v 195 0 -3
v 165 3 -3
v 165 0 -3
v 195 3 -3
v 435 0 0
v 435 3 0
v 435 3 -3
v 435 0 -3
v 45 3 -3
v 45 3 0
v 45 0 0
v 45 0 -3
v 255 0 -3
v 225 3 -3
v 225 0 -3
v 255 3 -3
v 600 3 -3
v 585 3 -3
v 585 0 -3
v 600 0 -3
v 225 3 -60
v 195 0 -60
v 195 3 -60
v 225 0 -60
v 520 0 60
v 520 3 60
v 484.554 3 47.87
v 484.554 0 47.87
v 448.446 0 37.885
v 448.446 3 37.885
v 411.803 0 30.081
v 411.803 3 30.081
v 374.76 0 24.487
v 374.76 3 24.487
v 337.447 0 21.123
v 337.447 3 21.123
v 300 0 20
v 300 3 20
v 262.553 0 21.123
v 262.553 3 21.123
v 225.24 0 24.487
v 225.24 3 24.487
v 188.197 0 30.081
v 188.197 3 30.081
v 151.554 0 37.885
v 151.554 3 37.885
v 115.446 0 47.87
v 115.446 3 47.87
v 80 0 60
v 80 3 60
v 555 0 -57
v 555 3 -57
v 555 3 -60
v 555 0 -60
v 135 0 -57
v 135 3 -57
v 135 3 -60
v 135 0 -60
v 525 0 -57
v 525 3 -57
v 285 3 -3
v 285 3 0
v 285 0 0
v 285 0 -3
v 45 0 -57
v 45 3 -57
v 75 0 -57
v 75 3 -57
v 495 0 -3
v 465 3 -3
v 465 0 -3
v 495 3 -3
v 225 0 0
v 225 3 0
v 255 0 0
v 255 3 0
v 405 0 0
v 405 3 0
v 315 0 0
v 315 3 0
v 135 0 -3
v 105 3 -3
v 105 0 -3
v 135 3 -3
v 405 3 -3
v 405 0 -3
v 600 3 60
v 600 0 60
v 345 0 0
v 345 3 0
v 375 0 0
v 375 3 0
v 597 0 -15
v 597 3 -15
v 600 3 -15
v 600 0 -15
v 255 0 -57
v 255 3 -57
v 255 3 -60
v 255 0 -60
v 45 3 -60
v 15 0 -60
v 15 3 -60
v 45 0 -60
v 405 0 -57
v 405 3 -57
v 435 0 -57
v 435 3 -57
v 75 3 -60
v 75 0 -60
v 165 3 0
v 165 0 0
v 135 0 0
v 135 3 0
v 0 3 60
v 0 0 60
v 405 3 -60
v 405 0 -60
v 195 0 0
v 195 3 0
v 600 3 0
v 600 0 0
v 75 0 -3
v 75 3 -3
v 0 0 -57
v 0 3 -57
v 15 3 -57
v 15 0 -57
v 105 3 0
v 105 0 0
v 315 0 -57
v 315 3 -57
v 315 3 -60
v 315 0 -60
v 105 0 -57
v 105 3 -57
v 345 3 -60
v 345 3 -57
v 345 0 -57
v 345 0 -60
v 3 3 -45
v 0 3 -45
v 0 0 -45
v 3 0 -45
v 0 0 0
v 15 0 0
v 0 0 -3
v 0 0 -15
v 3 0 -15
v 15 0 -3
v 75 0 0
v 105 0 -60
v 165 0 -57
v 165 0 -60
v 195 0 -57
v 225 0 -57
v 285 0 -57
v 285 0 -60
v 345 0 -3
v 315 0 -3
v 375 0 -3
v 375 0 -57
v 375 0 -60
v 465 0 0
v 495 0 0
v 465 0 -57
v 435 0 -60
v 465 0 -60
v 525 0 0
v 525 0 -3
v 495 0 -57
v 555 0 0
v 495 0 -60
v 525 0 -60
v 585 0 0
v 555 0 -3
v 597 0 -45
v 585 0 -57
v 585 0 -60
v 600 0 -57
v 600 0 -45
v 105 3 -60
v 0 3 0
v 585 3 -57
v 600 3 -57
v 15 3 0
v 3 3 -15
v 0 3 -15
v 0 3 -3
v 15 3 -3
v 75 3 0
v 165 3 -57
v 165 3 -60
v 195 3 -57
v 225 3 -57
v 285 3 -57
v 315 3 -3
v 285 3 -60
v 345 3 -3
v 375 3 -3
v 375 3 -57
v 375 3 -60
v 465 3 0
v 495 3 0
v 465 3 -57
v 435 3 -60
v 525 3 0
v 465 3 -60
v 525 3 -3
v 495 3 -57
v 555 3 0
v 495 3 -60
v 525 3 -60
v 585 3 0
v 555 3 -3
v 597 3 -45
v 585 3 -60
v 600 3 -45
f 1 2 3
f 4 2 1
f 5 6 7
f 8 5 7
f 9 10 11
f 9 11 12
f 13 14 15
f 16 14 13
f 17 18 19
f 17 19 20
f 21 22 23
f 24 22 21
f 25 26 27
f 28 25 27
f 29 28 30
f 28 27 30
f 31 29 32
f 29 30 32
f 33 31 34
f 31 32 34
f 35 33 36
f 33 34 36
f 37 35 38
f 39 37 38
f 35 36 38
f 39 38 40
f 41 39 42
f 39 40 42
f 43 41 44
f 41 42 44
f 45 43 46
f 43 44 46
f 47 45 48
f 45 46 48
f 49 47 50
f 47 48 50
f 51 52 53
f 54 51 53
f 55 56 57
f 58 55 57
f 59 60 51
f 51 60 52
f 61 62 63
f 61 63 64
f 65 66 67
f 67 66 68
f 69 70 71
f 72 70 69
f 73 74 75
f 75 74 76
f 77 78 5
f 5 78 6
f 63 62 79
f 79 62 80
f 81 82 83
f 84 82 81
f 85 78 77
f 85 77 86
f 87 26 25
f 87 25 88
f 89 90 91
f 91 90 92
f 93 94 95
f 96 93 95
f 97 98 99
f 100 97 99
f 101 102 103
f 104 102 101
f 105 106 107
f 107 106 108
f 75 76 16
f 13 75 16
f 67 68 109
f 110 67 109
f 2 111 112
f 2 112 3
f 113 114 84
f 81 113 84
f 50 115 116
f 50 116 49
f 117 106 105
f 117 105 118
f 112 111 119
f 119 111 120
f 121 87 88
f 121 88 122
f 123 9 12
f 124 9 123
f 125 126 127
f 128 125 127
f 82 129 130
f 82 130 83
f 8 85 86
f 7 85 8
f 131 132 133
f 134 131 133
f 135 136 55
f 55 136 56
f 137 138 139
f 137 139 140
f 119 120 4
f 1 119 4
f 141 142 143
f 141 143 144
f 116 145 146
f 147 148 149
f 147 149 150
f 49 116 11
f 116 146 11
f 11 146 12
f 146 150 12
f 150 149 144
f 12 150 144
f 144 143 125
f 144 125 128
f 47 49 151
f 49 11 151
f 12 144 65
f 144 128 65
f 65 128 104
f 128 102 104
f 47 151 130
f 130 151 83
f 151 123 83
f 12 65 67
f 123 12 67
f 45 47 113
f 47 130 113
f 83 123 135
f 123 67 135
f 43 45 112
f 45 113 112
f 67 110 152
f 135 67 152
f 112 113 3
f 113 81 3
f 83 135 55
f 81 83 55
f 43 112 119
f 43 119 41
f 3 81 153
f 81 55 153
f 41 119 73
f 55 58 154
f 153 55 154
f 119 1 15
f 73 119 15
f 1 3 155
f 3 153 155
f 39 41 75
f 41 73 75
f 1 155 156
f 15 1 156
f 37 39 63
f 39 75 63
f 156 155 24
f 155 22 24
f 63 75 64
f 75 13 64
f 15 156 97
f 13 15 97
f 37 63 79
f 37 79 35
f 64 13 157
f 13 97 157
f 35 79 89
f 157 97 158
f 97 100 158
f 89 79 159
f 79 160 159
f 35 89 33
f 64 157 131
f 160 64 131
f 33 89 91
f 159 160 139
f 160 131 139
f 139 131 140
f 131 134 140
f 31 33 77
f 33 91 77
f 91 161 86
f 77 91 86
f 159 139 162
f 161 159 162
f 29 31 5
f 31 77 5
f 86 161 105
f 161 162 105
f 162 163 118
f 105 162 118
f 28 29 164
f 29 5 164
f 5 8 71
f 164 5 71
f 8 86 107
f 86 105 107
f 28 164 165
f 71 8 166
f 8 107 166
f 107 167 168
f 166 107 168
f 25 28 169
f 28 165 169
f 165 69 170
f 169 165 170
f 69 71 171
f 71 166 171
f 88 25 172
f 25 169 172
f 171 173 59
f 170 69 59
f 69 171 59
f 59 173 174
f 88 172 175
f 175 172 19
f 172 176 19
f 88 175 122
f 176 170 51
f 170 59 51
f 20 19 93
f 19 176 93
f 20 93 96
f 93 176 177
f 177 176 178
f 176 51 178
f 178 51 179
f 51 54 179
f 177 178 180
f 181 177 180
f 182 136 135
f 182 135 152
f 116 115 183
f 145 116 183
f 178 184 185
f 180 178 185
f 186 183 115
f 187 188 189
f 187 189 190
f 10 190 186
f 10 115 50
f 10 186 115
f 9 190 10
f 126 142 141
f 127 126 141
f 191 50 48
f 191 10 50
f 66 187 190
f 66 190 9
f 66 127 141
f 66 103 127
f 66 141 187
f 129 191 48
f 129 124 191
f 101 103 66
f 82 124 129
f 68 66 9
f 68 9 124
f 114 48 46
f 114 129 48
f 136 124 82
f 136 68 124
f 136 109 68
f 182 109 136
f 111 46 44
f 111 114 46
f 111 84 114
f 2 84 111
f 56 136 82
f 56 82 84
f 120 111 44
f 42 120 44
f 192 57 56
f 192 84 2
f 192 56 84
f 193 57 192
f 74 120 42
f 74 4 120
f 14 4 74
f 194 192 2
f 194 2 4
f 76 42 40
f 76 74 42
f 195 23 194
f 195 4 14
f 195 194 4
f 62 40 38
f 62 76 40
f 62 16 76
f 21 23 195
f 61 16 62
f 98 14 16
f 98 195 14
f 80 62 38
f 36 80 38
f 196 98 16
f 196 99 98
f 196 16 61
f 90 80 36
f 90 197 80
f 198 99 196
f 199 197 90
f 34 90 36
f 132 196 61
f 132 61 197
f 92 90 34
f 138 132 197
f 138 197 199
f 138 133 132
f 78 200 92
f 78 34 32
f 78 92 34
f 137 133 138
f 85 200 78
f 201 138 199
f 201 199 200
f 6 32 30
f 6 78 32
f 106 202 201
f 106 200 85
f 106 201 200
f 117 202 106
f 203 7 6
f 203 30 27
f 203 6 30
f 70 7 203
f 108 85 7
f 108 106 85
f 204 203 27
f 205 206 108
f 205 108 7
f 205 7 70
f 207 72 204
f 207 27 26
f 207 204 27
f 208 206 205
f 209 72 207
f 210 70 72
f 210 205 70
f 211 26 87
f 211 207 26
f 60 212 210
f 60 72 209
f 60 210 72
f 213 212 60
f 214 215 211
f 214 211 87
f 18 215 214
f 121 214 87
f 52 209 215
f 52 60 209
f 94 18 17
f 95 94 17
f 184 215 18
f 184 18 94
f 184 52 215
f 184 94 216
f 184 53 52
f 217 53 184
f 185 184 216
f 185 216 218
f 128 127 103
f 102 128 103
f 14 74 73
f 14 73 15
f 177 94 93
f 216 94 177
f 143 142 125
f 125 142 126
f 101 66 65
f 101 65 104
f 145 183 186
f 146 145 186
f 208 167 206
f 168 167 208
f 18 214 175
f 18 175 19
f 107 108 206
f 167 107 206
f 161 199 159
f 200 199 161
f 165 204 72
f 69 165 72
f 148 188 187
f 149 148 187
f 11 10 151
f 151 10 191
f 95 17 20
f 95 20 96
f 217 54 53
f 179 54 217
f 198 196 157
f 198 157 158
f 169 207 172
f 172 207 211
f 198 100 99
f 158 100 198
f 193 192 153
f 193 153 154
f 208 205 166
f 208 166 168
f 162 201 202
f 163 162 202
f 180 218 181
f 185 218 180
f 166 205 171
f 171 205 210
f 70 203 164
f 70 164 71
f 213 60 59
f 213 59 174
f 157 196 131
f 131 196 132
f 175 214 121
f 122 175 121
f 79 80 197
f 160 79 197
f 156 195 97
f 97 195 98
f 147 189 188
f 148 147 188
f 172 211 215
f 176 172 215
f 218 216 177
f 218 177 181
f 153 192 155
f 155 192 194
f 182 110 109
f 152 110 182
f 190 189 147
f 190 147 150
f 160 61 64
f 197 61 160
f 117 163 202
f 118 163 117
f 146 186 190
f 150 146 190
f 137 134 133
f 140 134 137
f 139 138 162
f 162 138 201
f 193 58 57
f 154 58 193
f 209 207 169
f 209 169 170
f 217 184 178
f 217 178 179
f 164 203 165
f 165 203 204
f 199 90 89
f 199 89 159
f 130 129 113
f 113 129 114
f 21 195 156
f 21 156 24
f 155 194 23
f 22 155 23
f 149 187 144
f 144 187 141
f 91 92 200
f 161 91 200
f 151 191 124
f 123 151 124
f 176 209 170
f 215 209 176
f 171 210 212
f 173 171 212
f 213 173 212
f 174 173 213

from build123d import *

# Parameters (mm, degrees)
SKETCH1_W           = 600
SKETCH1_H           = 60
BOSS_EXTRUDE1_DEPTH = 3
SKETCH3_W           = 600
SKETCH3_H           = 60
BOSS_EXTRUDE2_DEPTH = 3
SKETCH2_W           = 30
SKETCH2_H           = 3
SKETCH2_W_2         = 3
SKETCH2_H_2         = 30
CUT_EXTRUDE1_DEPTH  = 5
CUT_EXTRUDE2_DEPTH  = 5


with BuildPart() as part:
    # Sketch1 → Boss-Extrude1 (new body)
    with BuildSketch(Plane(origin=(0, 0, 0), x_dir=(1, 0, 0), z_dir=(0, 1, 0))):
        with Locations((300, 30)):
            Rectangle(SKETCH1_W, SKETCH1_H)
    extrude(amount=BOSS_EXTRUDE1_DEPTH)

    # Sketch3 → Boss-Extrude2 (add)
    with BuildSketch(Plane(origin=(0, 3, 0), x_dir=(1, 0, 0), z_dir=(0, 1, 0))):
        with Locations((300, -30)):
            Rectangle(SKETCH3_W, SKETCH3_H)
    extrude(amount=-BOSS_EXTRUDE2_DEPTH)

    # Sketch2 → Cut-Extrude1 (cut)
    with BuildSketch(Plane(origin=(0, 3, 0), x_dir=(1, 0, 0), z_dir=(0, 1, 0))):
        with Locations((0, 1.5)):
            Rectangle(SKETCH2_W, SKETCH2_H)
        with Locations((60, 1.5)):
            Rectangle(SKETCH2_W, SKETCH2_H)
        with Locations((120, 1.5)):
            Rectangle(SKETCH2_W, SKETCH2_H)
        with Locations((180, 1.5)):
            Rectangle(SKETCH2_W, SKETCH2_H)
        with Locations((240, 1.5)):
            Rectangle(SKETCH2_W, SKETCH2_H)
        with Locations((300, 1.5)):
            Rectangle(SKETCH2_W, SKETCH2_H)
        with Locations((360, 1.5)):
            Rectangle(SKETCH2_W, SKETCH2_H)
        with Locations((420, 1.5)):
            Rectangle(SKETCH2_W, SKETCH2_H)
        with Locations((480, 1.5)):
            Rectangle(SKETCH2_W, SKETCH2_H)
        with Locations((540, 1.5)):
            Rectangle(SKETCH2_W, SKETCH2_H)
        with Locations((540, 58.5)):
            Rectangle(SKETCH2_W, SKETCH2_H)
        with Locations((480, 58.5)):
            Rectangle(SKETCH2_W, SKETCH2_H)
        with Locations((420, 58.5)):
            Rectangle(SKETCH2_W, SKETCH2_H)
        with Locations((360, 58.5)):
            Rectangle(SKETCH2_W, SKETCH2_H)
        with Locations((300, 58.5)):
            Rectangle(SKETCH2_W, SKETCH2_H)
        with Locations((240, 58.5)):
            Rectangle(SKETCH2_W, SKETCH2_H)
        with Locations((180, 58.5)):
            Rectangle(SKETCH2_W, SKETCH2_H)
        with Locations((120, 58.5)):
            Rectangle(SKETCH2_W, SKETCH2_H)
        with Locations((60, 58.5)):
            Rectangle(SKETCH2_W, SKETCH2_H)
        with Locations((0, 58.5)):
            Rectangle(SKETCH2_W, SKETCH2_H)
        with Locations((1.5, 30)):
            Rectangle(SKETCH2_W_2, SKETCH2_H_2)
        with Locations((598.5, 30)):
            Rectangle(SKETCH2_W_2, SKETCH2_H_2)
        with Locations((600, 1.5)):
            Rectangle(SKETCH2_W, SKETCH2_H)
        with Locations((600, 58.5)):
            Rectangle(SKETCH2_W, SKETCH2_H)
    extrude(amount=-CUT_EXTRUDE1_DEPTH, mode=Mode.SUBTRACT)

    # Sketch4 → Cut-Extrude2 (cut)
    with BuildSketch(Plane(origin=(0, 3, 0), x_dir=(1, 0, 0), z_dir=(0, 1, 0))):
        with BuildLine():
            Line((80, -60), (520, -60))
            ThreePointArc((520, -60), (300, -20), (80, -60))
        make_face()
    extrude(amount=-CUT_EXTRUDE2_DEPTH, mode=Mode.SUBTRACT)


solid = part.part
